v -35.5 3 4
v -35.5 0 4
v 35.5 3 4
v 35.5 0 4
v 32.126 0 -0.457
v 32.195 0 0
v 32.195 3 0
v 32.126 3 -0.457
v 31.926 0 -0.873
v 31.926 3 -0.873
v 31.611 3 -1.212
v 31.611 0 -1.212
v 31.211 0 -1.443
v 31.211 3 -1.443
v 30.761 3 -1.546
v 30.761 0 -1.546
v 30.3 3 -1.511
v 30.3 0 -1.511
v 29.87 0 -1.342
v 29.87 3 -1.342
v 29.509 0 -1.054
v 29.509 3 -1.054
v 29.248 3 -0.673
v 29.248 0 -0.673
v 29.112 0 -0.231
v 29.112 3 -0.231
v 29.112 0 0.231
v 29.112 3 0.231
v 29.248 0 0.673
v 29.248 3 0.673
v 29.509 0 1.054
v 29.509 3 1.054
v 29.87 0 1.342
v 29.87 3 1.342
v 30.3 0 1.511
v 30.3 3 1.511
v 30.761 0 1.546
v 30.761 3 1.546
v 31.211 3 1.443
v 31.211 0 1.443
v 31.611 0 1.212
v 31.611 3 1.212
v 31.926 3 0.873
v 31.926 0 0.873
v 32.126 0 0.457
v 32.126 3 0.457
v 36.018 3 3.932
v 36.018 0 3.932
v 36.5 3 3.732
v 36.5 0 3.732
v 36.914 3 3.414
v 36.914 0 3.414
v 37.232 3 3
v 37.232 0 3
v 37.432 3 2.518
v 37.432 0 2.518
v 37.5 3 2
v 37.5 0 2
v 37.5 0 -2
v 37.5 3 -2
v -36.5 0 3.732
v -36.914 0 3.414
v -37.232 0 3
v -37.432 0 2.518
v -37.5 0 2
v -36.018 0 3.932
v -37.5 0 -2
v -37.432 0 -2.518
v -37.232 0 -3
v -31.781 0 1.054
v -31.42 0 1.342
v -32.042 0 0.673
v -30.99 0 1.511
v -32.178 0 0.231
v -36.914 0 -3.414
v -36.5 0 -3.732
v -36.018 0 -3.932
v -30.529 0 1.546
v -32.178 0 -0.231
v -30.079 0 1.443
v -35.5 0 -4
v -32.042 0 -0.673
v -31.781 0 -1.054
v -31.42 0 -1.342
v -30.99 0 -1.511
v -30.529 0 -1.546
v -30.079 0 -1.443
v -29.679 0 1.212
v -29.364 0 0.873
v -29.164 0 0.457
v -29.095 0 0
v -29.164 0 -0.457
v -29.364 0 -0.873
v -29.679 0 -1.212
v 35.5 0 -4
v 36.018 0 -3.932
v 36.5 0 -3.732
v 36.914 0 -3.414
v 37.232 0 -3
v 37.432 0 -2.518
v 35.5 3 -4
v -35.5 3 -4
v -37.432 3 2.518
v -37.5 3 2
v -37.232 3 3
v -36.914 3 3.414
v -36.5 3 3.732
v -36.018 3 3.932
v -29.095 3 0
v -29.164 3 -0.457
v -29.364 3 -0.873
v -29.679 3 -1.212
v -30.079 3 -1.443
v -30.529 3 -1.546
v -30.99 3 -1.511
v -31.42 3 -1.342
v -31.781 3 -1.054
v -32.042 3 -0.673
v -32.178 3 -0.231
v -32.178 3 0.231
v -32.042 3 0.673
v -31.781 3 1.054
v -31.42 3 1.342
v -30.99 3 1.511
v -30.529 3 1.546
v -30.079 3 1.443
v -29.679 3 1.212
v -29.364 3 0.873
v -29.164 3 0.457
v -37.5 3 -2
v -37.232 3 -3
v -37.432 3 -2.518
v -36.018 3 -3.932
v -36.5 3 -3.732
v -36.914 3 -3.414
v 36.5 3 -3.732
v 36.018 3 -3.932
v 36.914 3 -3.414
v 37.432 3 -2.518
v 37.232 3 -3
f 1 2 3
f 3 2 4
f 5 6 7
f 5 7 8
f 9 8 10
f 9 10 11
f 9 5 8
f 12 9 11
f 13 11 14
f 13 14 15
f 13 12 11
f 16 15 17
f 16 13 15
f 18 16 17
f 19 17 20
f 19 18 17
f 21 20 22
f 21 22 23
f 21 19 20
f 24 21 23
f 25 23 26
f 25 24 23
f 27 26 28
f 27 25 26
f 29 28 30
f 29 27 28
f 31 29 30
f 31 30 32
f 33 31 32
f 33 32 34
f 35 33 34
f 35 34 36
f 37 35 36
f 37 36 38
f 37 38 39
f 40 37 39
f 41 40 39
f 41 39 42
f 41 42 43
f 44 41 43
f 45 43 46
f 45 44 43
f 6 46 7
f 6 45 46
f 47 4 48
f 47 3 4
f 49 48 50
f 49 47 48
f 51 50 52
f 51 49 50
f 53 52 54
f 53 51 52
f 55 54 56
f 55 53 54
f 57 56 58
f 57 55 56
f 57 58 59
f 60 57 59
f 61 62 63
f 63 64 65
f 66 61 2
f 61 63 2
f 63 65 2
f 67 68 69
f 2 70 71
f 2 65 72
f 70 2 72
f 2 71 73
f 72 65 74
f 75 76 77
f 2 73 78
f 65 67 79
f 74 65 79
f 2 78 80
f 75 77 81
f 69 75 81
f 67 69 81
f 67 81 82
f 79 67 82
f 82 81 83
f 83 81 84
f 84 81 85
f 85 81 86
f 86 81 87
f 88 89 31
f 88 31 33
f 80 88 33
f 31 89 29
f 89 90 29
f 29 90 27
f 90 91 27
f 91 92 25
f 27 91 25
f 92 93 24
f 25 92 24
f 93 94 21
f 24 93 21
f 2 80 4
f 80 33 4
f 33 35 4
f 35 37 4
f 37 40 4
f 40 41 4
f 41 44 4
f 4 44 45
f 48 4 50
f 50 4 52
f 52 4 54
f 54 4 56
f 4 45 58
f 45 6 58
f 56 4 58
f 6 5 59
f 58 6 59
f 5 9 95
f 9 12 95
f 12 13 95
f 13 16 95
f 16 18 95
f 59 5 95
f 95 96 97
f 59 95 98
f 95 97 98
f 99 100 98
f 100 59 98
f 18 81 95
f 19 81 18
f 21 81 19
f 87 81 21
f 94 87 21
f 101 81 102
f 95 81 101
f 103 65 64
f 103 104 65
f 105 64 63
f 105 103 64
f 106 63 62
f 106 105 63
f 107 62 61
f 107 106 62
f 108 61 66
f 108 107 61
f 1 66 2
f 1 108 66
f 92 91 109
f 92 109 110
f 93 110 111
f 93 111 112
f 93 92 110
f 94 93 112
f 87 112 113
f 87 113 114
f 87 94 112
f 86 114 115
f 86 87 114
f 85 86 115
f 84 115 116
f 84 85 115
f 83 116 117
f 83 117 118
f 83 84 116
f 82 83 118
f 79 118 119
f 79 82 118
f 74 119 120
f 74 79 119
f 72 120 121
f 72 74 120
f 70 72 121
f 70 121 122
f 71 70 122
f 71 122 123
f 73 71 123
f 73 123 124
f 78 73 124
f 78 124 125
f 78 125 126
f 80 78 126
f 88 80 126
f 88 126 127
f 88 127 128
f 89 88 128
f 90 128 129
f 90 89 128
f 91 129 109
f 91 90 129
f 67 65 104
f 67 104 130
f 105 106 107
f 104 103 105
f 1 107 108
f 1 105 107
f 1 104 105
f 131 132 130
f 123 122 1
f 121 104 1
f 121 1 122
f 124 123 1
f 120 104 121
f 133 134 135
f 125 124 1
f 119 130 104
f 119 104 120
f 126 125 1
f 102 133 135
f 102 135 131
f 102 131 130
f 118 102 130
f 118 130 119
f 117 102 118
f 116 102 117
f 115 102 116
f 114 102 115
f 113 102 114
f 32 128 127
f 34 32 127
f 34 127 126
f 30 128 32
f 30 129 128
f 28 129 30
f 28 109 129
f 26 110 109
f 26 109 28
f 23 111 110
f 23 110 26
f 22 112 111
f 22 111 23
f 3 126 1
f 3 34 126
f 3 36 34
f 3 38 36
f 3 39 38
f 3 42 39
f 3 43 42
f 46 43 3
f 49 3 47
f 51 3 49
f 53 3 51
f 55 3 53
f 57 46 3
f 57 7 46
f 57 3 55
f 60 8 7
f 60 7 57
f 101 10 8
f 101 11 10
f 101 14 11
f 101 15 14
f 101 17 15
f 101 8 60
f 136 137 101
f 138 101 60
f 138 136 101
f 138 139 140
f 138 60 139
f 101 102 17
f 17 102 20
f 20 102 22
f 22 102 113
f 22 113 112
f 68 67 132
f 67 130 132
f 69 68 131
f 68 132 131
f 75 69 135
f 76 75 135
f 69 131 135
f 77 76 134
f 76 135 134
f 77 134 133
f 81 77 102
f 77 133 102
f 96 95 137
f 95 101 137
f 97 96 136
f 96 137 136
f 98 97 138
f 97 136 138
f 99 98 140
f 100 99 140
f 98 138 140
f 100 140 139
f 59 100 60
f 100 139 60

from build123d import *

# Parameters (mm, degrees)
SKETCH_1_W      = 75
SKETCH_1_H      = 8
SKETCH_1_R      = 1.55
EXTRUDE_1_DEPTH = 3
FILLET_1_R      = 2


with BuildPart() as part:
    # 草图1 → 凸台-拉伸1 (new body)
    with BuildSketch(Plane(origin=(0, 0, 0), x_dir=(1, 0, 0), z_dir=(0, 1, 0))):
        Rectangle(SKETCH_1_W, SKETCH_1_H)
        with Locations((-30.645, 0)):
            Circle(SKETCH_1_R, mode=Mode.SUBTRACT)
        with Locations((30.645, 0)):
            Circle(SKETCH_1_R, mode=Mode.SUBTRACT)
    extrude(amount=EXTRUDE_1_DEPTH)

    # 圆角1
    fillet_1_edges = [part.edges().sort_by_distance(p)[0] for p in [
        (-37.5, 1.5, -4),
        (37.5, 1.5, -4),
        (37.5, 1.5, 4),
        (-37.5, 1.5, 4),
    ]]
    fillet(fillet_1_edges, radius=FILLET_1_R)


solid = part.part
